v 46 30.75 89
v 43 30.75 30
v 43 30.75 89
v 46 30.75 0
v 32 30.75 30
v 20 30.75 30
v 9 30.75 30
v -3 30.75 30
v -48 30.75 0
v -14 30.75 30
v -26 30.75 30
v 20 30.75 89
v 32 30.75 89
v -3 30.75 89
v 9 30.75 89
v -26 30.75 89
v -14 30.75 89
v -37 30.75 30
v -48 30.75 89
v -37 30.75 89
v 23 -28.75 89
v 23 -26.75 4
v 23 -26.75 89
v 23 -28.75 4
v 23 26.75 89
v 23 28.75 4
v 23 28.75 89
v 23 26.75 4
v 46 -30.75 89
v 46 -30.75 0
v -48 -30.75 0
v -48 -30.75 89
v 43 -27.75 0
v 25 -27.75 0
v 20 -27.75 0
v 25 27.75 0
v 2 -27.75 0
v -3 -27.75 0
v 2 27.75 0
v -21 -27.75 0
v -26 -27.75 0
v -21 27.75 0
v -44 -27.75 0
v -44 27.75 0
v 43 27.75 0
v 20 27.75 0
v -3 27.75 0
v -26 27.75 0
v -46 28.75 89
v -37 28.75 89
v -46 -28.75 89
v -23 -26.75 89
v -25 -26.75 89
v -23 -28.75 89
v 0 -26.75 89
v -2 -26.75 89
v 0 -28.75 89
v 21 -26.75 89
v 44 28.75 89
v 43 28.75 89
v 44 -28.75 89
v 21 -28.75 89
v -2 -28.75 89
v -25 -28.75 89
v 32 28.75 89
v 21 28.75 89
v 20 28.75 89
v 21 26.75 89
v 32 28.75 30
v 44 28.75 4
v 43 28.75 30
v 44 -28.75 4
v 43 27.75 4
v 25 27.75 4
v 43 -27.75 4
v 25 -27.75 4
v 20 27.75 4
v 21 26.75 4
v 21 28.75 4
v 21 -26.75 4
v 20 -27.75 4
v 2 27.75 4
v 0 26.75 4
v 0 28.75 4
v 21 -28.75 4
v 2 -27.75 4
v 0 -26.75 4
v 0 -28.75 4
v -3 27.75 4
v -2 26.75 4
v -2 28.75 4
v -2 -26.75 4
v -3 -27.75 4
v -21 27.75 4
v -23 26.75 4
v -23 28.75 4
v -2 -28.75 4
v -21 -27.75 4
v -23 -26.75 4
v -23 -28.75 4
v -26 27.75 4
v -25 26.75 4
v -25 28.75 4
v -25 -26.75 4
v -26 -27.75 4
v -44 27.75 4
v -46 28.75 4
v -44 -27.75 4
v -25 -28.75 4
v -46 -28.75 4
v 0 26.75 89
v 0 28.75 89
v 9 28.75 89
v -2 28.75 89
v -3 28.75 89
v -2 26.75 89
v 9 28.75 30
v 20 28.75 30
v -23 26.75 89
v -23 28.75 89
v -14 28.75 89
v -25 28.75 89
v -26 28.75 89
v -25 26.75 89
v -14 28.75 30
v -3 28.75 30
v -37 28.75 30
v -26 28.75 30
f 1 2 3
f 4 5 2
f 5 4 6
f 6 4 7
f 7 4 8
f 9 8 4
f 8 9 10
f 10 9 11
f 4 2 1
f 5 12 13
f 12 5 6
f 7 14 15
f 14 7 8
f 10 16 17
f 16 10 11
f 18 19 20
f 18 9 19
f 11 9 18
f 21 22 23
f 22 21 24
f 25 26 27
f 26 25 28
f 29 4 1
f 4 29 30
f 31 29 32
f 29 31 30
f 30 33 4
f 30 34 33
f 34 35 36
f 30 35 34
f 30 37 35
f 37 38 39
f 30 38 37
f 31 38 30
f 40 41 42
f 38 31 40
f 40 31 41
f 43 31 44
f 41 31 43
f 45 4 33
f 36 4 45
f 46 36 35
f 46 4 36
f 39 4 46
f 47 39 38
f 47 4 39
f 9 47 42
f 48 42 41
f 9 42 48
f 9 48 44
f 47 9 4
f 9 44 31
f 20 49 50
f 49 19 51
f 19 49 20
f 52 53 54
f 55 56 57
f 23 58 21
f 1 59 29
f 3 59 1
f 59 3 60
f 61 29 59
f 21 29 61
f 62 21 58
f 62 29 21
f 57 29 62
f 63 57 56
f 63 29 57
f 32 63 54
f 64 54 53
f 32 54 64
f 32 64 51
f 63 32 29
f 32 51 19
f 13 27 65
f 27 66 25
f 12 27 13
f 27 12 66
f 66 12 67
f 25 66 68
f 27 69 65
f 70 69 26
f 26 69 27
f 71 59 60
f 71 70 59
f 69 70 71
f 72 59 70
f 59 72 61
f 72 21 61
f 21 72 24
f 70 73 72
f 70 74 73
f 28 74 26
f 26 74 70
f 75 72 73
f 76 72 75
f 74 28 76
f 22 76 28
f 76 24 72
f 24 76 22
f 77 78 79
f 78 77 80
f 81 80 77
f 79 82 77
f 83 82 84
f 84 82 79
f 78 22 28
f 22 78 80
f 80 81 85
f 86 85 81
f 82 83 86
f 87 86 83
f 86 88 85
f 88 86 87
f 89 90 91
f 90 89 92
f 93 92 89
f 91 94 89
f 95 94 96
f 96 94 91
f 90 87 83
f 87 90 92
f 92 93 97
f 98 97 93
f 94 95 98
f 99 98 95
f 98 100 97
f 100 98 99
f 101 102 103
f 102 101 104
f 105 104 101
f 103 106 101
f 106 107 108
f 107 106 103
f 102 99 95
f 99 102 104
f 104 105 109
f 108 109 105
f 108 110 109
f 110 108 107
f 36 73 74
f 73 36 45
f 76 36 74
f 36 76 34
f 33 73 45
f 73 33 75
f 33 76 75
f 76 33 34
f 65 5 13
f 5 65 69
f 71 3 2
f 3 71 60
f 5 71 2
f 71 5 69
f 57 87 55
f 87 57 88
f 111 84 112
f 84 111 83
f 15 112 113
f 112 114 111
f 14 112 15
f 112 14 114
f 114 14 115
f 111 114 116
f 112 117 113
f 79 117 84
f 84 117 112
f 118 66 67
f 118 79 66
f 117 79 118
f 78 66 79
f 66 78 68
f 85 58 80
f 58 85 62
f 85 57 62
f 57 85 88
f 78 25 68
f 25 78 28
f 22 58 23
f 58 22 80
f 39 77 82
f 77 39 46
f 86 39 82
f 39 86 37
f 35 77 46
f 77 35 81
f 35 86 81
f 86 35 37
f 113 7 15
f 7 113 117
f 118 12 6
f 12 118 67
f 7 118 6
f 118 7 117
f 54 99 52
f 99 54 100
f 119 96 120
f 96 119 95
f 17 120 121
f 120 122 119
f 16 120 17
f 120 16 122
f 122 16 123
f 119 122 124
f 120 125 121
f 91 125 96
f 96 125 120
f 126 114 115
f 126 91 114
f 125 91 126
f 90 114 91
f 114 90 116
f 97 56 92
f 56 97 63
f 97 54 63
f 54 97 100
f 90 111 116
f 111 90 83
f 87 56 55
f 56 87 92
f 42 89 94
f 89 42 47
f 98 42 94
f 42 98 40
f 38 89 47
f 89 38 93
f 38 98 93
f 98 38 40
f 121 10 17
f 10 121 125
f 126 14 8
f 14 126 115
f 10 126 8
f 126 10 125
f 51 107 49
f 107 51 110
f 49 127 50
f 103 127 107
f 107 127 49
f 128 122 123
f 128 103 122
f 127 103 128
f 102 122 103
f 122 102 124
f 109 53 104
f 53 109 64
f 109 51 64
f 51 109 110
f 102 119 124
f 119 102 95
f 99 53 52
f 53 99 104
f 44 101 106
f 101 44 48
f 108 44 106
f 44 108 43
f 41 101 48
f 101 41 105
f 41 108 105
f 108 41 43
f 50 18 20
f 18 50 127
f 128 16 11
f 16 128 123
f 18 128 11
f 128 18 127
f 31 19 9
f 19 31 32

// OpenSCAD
// preview[view:east, tilt:top]

/* [Global] */
//how many raspis to stack on each other
rack_height=4; //[1:10]


/* [Hidden] */
rpi_width=57.5;
rpi_length=87;
u_height=23;
wall=2;
ledge=2;
port_height=11;
port_len=61;

module rack_floor(){
cube([rpi_width+2*wall,rpi_length+wall,wall]);
}

module one_u(){
 difference(){
	cube([rpi_width+2*wall,rpi_length+wall,u_height]);
 // cut out main area
	translate([wall,-wall,wall])cube([rpi_width,rpi_length,u_height]);
  //cut floor
  translate([wall+ledge,-wall,-wall])cube([rpi_width-2*ledge,rpi_length,3*wall]);

  //back
	translate([wall+1,rpi_length-2*wall,ledge+1])cube([rpi_width-2,5*wall,u_height-1-2*wall]);
  //side ports
  translate([rpi_width,-wall,wall+1])cube([5*wall,port_len,port_height]);
 }
}

module raspi_rack(){
	rack_floor();
	for(i=[1:rack_height]){
		translate([0,0,(i-1)*u_height])one_u();
	}
	//roof
	translate([0,0,rack_height*u_height])rack_floor();
}

//rotate & center
translate([(rack_height*u_height)/2,-(rpi_width+2*wall)/2,rpi_length+wall])rotate([-90,0,90])raspi_rack();
